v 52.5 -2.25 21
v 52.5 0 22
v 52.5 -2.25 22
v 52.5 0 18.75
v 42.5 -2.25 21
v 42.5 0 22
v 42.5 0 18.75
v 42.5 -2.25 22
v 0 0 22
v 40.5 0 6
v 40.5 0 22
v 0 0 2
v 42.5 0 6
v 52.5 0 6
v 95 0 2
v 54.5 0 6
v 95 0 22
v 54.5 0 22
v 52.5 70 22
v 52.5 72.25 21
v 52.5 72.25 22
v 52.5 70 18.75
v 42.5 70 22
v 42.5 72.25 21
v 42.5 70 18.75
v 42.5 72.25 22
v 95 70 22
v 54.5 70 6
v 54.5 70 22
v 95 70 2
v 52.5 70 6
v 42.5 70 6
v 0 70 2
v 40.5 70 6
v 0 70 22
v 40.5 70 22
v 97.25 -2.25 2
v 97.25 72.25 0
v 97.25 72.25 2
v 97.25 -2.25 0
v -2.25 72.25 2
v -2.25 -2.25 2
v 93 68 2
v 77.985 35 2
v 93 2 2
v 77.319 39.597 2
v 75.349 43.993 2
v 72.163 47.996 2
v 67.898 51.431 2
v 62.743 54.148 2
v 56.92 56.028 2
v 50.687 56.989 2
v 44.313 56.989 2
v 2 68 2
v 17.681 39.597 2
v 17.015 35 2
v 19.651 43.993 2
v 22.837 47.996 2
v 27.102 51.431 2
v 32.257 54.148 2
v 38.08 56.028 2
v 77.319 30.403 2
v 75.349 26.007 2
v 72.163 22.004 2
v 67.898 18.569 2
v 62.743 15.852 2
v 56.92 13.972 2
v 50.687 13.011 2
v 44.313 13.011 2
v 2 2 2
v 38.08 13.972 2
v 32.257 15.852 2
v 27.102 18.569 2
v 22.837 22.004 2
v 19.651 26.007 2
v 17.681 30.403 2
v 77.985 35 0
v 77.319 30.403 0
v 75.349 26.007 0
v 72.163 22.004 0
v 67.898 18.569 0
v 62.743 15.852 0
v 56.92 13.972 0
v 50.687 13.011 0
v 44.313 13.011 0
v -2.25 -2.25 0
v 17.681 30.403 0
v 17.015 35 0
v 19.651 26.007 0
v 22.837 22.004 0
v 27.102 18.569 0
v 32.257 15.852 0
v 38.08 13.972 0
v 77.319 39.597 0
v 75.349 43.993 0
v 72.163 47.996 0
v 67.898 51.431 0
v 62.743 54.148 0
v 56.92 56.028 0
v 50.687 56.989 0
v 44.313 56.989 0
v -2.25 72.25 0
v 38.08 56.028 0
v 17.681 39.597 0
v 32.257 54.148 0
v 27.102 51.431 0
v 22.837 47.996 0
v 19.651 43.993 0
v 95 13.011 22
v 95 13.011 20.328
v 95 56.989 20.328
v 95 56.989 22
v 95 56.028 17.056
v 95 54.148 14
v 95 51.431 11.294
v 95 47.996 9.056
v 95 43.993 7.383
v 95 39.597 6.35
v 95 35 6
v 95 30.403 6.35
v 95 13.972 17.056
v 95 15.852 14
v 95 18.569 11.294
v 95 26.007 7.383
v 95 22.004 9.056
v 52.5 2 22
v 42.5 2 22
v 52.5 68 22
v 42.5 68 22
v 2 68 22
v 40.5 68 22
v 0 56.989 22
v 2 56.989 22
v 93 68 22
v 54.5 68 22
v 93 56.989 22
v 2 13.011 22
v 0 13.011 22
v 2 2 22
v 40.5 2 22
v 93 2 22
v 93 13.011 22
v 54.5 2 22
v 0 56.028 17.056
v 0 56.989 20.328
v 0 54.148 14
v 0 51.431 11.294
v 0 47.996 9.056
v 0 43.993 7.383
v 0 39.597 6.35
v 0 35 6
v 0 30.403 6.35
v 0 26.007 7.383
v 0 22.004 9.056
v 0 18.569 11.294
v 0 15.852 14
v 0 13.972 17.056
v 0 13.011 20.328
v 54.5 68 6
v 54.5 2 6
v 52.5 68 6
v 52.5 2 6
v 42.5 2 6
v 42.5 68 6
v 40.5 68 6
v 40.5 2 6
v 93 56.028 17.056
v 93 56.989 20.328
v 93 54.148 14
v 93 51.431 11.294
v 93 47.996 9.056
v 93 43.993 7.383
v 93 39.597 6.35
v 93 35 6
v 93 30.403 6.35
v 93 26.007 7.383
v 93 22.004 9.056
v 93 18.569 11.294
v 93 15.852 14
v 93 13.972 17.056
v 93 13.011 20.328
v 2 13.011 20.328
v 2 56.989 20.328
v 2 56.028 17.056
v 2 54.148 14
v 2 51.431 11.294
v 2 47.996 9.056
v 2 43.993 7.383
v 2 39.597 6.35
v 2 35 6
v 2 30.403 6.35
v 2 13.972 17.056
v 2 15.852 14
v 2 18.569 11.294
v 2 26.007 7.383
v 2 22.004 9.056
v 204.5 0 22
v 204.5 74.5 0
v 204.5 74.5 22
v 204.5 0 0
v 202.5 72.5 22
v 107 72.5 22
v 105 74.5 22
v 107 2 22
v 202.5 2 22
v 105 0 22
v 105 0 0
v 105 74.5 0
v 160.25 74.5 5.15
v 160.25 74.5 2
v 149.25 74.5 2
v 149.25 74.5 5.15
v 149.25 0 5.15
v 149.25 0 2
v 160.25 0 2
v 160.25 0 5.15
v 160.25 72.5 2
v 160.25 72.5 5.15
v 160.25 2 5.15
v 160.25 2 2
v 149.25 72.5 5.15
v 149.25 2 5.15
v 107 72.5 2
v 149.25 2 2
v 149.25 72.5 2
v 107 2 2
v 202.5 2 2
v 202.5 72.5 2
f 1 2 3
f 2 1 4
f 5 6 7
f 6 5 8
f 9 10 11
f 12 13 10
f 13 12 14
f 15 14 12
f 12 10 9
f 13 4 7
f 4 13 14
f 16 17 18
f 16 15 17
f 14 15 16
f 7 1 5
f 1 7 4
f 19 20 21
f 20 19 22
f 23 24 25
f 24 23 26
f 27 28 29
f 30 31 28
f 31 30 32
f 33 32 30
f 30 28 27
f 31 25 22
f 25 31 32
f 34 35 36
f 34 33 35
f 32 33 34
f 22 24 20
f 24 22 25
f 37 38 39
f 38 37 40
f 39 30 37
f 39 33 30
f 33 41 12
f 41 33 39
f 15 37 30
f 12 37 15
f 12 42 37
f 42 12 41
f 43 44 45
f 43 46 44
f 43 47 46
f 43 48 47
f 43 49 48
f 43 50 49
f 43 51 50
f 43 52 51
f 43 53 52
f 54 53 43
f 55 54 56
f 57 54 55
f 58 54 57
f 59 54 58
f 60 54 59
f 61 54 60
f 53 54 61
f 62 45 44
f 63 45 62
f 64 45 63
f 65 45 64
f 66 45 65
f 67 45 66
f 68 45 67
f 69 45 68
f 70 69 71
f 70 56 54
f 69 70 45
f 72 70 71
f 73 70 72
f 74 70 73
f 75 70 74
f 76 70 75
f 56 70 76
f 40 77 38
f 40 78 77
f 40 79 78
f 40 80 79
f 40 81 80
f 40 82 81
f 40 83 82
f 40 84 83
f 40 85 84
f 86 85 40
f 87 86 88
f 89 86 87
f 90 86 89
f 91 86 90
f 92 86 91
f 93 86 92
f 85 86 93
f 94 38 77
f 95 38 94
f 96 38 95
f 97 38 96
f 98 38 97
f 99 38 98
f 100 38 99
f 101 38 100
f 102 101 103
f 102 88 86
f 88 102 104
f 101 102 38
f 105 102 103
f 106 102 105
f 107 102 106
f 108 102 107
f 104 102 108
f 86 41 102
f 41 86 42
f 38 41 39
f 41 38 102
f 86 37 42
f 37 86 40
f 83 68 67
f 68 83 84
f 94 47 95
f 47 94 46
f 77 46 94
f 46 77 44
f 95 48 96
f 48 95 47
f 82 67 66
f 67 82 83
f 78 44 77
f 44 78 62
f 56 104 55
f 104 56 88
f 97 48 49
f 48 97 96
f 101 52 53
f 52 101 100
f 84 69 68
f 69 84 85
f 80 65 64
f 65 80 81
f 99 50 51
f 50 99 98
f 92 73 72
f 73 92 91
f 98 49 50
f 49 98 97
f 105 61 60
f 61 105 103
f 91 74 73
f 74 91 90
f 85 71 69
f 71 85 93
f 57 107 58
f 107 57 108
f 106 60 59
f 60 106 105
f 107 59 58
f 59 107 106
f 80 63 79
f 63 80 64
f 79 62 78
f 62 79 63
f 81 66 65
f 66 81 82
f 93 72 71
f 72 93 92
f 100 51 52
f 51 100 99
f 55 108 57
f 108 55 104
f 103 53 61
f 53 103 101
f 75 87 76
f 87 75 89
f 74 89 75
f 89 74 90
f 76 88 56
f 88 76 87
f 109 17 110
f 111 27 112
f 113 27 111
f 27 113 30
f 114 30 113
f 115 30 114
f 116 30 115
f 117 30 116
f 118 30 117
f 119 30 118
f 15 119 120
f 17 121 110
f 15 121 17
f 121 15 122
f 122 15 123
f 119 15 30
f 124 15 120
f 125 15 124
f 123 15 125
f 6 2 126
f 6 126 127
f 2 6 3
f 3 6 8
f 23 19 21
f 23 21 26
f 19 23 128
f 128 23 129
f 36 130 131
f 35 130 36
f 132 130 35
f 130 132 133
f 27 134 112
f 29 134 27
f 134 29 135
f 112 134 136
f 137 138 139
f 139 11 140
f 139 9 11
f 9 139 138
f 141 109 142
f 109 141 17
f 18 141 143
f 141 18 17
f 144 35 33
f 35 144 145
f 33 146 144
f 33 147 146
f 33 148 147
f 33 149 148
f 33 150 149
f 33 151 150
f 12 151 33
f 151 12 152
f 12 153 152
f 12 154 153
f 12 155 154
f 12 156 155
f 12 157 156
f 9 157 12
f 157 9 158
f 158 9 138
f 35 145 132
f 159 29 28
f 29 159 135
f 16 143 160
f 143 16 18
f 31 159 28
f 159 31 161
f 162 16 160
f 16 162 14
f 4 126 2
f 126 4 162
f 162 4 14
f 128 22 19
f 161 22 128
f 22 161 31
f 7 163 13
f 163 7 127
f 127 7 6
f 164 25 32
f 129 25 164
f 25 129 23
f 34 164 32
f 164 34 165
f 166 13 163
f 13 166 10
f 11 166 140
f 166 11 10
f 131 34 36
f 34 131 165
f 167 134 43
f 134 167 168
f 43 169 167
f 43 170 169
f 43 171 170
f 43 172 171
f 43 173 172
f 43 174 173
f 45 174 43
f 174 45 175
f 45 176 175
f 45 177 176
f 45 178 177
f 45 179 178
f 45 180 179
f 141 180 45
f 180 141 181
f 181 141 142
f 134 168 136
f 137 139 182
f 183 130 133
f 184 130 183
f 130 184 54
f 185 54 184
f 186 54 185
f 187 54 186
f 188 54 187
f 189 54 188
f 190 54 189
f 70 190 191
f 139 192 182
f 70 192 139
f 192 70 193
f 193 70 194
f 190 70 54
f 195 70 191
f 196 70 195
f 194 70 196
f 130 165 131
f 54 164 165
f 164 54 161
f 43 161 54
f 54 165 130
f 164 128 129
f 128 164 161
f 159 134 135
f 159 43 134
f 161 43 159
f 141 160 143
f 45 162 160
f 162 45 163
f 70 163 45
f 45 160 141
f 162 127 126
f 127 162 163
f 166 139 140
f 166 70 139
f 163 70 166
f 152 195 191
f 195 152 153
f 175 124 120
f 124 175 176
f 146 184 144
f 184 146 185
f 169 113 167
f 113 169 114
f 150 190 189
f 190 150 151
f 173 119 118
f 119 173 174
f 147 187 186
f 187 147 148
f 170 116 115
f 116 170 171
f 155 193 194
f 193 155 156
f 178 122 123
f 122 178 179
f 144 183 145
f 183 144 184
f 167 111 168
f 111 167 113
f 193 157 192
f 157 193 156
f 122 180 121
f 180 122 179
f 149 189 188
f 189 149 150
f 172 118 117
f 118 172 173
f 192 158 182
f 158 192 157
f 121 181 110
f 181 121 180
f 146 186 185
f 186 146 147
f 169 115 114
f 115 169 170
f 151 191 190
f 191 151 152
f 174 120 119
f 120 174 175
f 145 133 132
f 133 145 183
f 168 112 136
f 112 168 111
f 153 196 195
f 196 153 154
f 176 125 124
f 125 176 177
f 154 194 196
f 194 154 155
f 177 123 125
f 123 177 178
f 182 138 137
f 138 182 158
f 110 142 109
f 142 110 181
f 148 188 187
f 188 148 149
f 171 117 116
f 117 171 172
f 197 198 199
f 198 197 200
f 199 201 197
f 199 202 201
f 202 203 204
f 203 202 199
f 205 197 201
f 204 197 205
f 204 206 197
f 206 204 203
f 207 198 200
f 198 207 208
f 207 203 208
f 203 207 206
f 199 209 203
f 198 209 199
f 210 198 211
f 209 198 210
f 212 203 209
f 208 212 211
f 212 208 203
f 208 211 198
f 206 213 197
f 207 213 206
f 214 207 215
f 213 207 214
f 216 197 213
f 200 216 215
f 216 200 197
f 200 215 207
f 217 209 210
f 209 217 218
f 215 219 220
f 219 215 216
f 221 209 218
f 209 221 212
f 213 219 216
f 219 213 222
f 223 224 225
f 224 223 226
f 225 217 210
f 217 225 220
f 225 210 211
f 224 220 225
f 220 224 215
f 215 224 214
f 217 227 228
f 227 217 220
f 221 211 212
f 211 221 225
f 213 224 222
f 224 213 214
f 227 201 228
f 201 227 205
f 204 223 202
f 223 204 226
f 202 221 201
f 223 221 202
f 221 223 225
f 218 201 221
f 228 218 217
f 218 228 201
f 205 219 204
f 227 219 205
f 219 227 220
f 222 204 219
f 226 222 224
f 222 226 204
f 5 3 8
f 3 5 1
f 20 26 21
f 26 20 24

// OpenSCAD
CARD_SIZE_LONG_EDGE =91;
CARD_SIZE_SHORT_EDGE = 66;
CARD_STACK_HEIGHT = 20;
WALL_THICKNESS = 2;
TAB_THICKNESS = 10;
EXTRA_SPACE = .25;
// rounded cutouts remove a "circle" from the bottom surface, and a 1/2 "circle" from each short end of the bottom piece
/* [Cutouts] */
// Percent of card deck height to cutout
END_CUTOUT_HEIGHT_PERCENTAGE = 80; // [0:100]
// Percent of box width to cutout
END_CUTOUT_WIDTH_PERCENTAGE  = 67; // [0:100]
// Percent of box width to cutout
BOTTOM_CUTOUT_WIDTH_PERCENTAGE = 67; // [0:100]
// percent of box length to cutout
BOTTOM_CUTOUT_LENGTH_PERCENTAGE = 67; // [0:100]
// preview[view:south west, tilt:top diagonal]


CARD_LONG_EDGE = CARD_SIZE_LONG_EDGE + (WALL_THICKNESS*2);
CARD_SHORT_EDGE = CARD_SIZE_SHORT_EDGE + (WALL_THICKNESS*2);
ALL_EXTRA_SPACE = (EXTRA_SPACE *2);

LID_OUTSIDE_LONG_THICKNESS = CARD_LONG_EDGE + (WALL_THICKNESS*2);
LID_OUTSIDE_SHORT_THICKNESS = CARD_SHORT_EDGE + (WALL_THICKNESS*2);

SPACE_BETWEEN_BOTTOM_AND_LID = LID_OUTSIDE_LONG_THICKNESS + (WALL_THICKNESS*2)+ 2;

HEIGHT = CARD_STACK_HEIGHT + WALL_THICKNESS;

// rounded cut-outs
// ends
END_CUTOUT_LENGTH = CARD_LONG_EDGE + 2;
END_CUTOUT_RADIUS = CARD_STACK_HEIGHT * END_CUTOUT_HEIGHT_PERCENTAGE/100;
END_CUTOUT_WIDTH  = CARD_SIZE_SHORT_EDGE * END_CUTOUT_WIDTH_PERCENTAGE/100;
// since we'll be scaling our cylinder, we really need the ratio to scale by for the longer dimension, not the direct dimension itself
END_CUTOUT_WIDTH_RATIO = END_CUTOUT_WIDTH / (END_CUTOUT_RADIUS*2);
// bottom
BOTTOM_CUTOUT_LENGTH = (WALL_THICKNESS * 2)+ 2;
BOTTOM_CUTOUT_RADIUS = CARD_SIZE_SHORT_EDGE * BOTTOM_CUTOUT_WIDTH_PERCENTAGE / 2 /100;
BOTTOM_CUTOUT_HEIGHT = CARD_SIZE_LONG_EDGE * BOTTOM_CUTOUT_LENGTH_PERCENTAGE/100;
// since we'll be scaling our cylinder, we really need the ratio to scale by for the longer dimension, not the direct dimension itself
BOTTOM_CUTOUT_HEIGHT_RATIO = BOTTOM_CUTOUT_HEIGHT / (BOTTOM_CUTOUT_RADIUS*2);


	//*Start Bottom of Box

					//*Start wedge 1
translate ([((CARD_LONG_EDGE/2) -(TAB_THICKNESS/2)),-WALL_THICKNESS-EXTRA_SPACE,HEIGHT-WALL_THICKNESS-1-EXTRA_SPACE]) 

difference (){
cube ([TAB_THICKNESS,WALL_THICKNESS+EXTRA_SPACE,WALL_THICKNESS+EXTRA_SPACE]);
translate ([0, WALL_THICKNESS+(EXTRA_SPACE),0]) rotate ([135,0,0])  

cube ([(TAB_THICKNESS+3), sqrt(((WALL_THICKNESS+EXTRA_SPACE)*(WALL_THICKNESS+EXTRA_SPACE))+((WALL_THICKNESS+EXTRA_SPACE)*(WALL_THICKNESS+EXTRA_SPACE))), sqrt(((WALL_THICKNESS+EXTRA_SPACE)*(WALL_THICKNESS+EXTRA_SPACE))+((WALL_THICKNESS+EXTRA_SPACE)*(WALL_THICKNESS+EXTRA_SPACE)))]);

}
			//*end wedge 1


			//*Start wedge 2
translate ([((CARD_LONG_EDGE/2) - (TAB_THICKNESS/2)),CARD_SHORT_EDGE,HEIGHT-WALL_THICKNESS-1-EXTRA_SPACE])

 difference (){
cube ([TAB_THICKNESS,WALL_THICKNESS+EXTRA_SPACE,WALL_THICKNESS+EXTRA_SPACE]);

translate ([0 ,0 ,0]) rotate ([-45,0,0])  cube ([(TAB_THICKNESS+3),sqrt(((WALL_THICKNESS+EXTRA_SPACE)*(WALL_THICKNESS+EXTRA_SPACE))+((WALL_THICKNESS+EXTRA_SPACE)*(WALL_THICKNESS+EXTRA_SPACE))),sqrt(((WALL_THICKNESS+EXTRA_SPACE)*(WALL_THICKNESS+EXTRA_SPACE))+((WALL_THICKNESS+EXTRA_SPACE)*(WALL_THICKNESS+EXTRA_SPACE)))]);
}
			//*end wedge 2


translate ([((CARD_LONG_EDGE/2) -(TAB_THICKNESS/2)),-WALL_THICKNESS-EXTRA_SPACE,HEIGHT-1])  cube ([TAB_THICKNESS, WALL_THICKNESS+EXTRA_SPACE, 1]); 					//*Tab

translate ([((CARD_LONG_EDGE/2) -(TAB_THICKNESS/2)),CARD_SHORT_EDGE,HEIGHT-1])  cube ([TAB_THICKNESS, WALL_THICKNESS+EXTRA_SPACE, 1]);				//*Tab

difference()
{
	translate ([-WALL_THICKNESS-EXTRA_SPACE, -WALL_THICKNESS-EXTRA_SPACE, 0 ]) cube ([CARD_LONG_EDGE + (WALL_THICKNESS*2)+ALL_EXTRA_SPACE, CARD_SHORT_EDGE + (WALL_THICKNESS*2)+ALL_EXTRA_SPACE, WALL_THICKNESS]);  						//*Bottom Plate

	translate([CARD_LONG_EDGE/2,CARD_SHORT_EDGE/2,-WALL_THICKNESS]) scale([BOTTOM_CUTOUT_HEIGHT_RATIO,1,1]) cylinder(h=BOTTOM_CUTOUT_LENGTH,r=BOTTOM_CUTOUT_RADIUS);  //*Bottom cutout to cut through bottom plate
}

difference() 
{
	cube ([CARD_LONG_EDGE,CARD_SHORT_EDGE,HEIGHT]);		//*Main Body

	translate([ ((CARD_LONG_EDGE / 2) + (TAB_THICKNESS/2)), -.5, ((HEIGHT+ WALL_THICKNESS) / 4) ]) cube ([2, CARD_SHORT_EDGE + 2, HEIGHT]);	//*Tab cutout
	
	translate([ ((CARD_LONG_EDGE / 2) - ((TAB_THICKNESS/2)+2)), -.5, ((HEIGHT+ WALL_THICKNESS)/ 4) ]) cube ([2, CARD_SHORT_EDGE + 2, HEIGHT ]);  //*Tab cutout

	translate([WALL_THICKNESS,WALL_THICKNESS,WALL_THICKNESS]) cube ([CARD_LONG_EDGE - (WALL_THICKNESS*2),CARD_SHORT_EDGE - (WALL_THICKNESS*2),HEIGHT]);			//*Hole

    translate([-WALL_THICKNESS/2,CARD_SHORT_EDGE/2,HEIGHT]) scale([1,END_CUTOUT_WIDTH_RATIO,1]) rotate([0,90,0]) cylinder(h=END_CUTOUT_LENGTH,r=END_CUTOUT_RADIUS);  //*End cutout
	translate([CARD_LONG_EDGE/2,CARD_SHORT_EDGE/2,-WALL_THICKNESS]) scale([BOTTOM_CUTOUT_HEIGHT_RATIO,1,1]) cylinder(h=BOTTOM_CUTOUT_LENGTH,r=BOTTOM_CUTOUT_RADIUS);  //*Bottom cutout to cut through main box
}
			//*End Bottom of Box



			//*Start Top of Box


translate ([SPACE_BETWEEN_BOTTOM_AND_LID, 0, 0]) 


difference() 
{
	cube ([LID_OUTSIDE_LONG_THICKNESS+ALL_EXTRA_SPACE, LID_OUTSIDE_SHORT_THICKNESS+ALL_EXTRA_SPACE, HEIGHT]); 		//*Top Main Body


	translate([ ((LID_OUTSIDE_LONG_THICKNESS+ALL_EXTRA_SPACE) / 2)-((TAB_THICKNESS+1)/2), -.5, WALL_THICKNESS]) 
cube ([(TAB_THICKNESS+1), LID_OUTSIDE_SHORT_THICKNESS + 2, WALL_THICKNESS+1.15 ]); 	//*Tab Hole

	translate([WALL_THICKNESS,WALL_THICKNESS, WALL_THICKNESS]) 
cube ([LID_OUTSIDE_LONG_THICKNESS - (WALL_THICKNESS*2)+ALL_EXTRA_SPACE,LID_OUTSIDE_SHORT_THICKNESS - (WALL_THICKNESS*2)+ALL_EXTRA_SPACE,HEIGHT]);		//*Hole
}

			//* End Top of Box
